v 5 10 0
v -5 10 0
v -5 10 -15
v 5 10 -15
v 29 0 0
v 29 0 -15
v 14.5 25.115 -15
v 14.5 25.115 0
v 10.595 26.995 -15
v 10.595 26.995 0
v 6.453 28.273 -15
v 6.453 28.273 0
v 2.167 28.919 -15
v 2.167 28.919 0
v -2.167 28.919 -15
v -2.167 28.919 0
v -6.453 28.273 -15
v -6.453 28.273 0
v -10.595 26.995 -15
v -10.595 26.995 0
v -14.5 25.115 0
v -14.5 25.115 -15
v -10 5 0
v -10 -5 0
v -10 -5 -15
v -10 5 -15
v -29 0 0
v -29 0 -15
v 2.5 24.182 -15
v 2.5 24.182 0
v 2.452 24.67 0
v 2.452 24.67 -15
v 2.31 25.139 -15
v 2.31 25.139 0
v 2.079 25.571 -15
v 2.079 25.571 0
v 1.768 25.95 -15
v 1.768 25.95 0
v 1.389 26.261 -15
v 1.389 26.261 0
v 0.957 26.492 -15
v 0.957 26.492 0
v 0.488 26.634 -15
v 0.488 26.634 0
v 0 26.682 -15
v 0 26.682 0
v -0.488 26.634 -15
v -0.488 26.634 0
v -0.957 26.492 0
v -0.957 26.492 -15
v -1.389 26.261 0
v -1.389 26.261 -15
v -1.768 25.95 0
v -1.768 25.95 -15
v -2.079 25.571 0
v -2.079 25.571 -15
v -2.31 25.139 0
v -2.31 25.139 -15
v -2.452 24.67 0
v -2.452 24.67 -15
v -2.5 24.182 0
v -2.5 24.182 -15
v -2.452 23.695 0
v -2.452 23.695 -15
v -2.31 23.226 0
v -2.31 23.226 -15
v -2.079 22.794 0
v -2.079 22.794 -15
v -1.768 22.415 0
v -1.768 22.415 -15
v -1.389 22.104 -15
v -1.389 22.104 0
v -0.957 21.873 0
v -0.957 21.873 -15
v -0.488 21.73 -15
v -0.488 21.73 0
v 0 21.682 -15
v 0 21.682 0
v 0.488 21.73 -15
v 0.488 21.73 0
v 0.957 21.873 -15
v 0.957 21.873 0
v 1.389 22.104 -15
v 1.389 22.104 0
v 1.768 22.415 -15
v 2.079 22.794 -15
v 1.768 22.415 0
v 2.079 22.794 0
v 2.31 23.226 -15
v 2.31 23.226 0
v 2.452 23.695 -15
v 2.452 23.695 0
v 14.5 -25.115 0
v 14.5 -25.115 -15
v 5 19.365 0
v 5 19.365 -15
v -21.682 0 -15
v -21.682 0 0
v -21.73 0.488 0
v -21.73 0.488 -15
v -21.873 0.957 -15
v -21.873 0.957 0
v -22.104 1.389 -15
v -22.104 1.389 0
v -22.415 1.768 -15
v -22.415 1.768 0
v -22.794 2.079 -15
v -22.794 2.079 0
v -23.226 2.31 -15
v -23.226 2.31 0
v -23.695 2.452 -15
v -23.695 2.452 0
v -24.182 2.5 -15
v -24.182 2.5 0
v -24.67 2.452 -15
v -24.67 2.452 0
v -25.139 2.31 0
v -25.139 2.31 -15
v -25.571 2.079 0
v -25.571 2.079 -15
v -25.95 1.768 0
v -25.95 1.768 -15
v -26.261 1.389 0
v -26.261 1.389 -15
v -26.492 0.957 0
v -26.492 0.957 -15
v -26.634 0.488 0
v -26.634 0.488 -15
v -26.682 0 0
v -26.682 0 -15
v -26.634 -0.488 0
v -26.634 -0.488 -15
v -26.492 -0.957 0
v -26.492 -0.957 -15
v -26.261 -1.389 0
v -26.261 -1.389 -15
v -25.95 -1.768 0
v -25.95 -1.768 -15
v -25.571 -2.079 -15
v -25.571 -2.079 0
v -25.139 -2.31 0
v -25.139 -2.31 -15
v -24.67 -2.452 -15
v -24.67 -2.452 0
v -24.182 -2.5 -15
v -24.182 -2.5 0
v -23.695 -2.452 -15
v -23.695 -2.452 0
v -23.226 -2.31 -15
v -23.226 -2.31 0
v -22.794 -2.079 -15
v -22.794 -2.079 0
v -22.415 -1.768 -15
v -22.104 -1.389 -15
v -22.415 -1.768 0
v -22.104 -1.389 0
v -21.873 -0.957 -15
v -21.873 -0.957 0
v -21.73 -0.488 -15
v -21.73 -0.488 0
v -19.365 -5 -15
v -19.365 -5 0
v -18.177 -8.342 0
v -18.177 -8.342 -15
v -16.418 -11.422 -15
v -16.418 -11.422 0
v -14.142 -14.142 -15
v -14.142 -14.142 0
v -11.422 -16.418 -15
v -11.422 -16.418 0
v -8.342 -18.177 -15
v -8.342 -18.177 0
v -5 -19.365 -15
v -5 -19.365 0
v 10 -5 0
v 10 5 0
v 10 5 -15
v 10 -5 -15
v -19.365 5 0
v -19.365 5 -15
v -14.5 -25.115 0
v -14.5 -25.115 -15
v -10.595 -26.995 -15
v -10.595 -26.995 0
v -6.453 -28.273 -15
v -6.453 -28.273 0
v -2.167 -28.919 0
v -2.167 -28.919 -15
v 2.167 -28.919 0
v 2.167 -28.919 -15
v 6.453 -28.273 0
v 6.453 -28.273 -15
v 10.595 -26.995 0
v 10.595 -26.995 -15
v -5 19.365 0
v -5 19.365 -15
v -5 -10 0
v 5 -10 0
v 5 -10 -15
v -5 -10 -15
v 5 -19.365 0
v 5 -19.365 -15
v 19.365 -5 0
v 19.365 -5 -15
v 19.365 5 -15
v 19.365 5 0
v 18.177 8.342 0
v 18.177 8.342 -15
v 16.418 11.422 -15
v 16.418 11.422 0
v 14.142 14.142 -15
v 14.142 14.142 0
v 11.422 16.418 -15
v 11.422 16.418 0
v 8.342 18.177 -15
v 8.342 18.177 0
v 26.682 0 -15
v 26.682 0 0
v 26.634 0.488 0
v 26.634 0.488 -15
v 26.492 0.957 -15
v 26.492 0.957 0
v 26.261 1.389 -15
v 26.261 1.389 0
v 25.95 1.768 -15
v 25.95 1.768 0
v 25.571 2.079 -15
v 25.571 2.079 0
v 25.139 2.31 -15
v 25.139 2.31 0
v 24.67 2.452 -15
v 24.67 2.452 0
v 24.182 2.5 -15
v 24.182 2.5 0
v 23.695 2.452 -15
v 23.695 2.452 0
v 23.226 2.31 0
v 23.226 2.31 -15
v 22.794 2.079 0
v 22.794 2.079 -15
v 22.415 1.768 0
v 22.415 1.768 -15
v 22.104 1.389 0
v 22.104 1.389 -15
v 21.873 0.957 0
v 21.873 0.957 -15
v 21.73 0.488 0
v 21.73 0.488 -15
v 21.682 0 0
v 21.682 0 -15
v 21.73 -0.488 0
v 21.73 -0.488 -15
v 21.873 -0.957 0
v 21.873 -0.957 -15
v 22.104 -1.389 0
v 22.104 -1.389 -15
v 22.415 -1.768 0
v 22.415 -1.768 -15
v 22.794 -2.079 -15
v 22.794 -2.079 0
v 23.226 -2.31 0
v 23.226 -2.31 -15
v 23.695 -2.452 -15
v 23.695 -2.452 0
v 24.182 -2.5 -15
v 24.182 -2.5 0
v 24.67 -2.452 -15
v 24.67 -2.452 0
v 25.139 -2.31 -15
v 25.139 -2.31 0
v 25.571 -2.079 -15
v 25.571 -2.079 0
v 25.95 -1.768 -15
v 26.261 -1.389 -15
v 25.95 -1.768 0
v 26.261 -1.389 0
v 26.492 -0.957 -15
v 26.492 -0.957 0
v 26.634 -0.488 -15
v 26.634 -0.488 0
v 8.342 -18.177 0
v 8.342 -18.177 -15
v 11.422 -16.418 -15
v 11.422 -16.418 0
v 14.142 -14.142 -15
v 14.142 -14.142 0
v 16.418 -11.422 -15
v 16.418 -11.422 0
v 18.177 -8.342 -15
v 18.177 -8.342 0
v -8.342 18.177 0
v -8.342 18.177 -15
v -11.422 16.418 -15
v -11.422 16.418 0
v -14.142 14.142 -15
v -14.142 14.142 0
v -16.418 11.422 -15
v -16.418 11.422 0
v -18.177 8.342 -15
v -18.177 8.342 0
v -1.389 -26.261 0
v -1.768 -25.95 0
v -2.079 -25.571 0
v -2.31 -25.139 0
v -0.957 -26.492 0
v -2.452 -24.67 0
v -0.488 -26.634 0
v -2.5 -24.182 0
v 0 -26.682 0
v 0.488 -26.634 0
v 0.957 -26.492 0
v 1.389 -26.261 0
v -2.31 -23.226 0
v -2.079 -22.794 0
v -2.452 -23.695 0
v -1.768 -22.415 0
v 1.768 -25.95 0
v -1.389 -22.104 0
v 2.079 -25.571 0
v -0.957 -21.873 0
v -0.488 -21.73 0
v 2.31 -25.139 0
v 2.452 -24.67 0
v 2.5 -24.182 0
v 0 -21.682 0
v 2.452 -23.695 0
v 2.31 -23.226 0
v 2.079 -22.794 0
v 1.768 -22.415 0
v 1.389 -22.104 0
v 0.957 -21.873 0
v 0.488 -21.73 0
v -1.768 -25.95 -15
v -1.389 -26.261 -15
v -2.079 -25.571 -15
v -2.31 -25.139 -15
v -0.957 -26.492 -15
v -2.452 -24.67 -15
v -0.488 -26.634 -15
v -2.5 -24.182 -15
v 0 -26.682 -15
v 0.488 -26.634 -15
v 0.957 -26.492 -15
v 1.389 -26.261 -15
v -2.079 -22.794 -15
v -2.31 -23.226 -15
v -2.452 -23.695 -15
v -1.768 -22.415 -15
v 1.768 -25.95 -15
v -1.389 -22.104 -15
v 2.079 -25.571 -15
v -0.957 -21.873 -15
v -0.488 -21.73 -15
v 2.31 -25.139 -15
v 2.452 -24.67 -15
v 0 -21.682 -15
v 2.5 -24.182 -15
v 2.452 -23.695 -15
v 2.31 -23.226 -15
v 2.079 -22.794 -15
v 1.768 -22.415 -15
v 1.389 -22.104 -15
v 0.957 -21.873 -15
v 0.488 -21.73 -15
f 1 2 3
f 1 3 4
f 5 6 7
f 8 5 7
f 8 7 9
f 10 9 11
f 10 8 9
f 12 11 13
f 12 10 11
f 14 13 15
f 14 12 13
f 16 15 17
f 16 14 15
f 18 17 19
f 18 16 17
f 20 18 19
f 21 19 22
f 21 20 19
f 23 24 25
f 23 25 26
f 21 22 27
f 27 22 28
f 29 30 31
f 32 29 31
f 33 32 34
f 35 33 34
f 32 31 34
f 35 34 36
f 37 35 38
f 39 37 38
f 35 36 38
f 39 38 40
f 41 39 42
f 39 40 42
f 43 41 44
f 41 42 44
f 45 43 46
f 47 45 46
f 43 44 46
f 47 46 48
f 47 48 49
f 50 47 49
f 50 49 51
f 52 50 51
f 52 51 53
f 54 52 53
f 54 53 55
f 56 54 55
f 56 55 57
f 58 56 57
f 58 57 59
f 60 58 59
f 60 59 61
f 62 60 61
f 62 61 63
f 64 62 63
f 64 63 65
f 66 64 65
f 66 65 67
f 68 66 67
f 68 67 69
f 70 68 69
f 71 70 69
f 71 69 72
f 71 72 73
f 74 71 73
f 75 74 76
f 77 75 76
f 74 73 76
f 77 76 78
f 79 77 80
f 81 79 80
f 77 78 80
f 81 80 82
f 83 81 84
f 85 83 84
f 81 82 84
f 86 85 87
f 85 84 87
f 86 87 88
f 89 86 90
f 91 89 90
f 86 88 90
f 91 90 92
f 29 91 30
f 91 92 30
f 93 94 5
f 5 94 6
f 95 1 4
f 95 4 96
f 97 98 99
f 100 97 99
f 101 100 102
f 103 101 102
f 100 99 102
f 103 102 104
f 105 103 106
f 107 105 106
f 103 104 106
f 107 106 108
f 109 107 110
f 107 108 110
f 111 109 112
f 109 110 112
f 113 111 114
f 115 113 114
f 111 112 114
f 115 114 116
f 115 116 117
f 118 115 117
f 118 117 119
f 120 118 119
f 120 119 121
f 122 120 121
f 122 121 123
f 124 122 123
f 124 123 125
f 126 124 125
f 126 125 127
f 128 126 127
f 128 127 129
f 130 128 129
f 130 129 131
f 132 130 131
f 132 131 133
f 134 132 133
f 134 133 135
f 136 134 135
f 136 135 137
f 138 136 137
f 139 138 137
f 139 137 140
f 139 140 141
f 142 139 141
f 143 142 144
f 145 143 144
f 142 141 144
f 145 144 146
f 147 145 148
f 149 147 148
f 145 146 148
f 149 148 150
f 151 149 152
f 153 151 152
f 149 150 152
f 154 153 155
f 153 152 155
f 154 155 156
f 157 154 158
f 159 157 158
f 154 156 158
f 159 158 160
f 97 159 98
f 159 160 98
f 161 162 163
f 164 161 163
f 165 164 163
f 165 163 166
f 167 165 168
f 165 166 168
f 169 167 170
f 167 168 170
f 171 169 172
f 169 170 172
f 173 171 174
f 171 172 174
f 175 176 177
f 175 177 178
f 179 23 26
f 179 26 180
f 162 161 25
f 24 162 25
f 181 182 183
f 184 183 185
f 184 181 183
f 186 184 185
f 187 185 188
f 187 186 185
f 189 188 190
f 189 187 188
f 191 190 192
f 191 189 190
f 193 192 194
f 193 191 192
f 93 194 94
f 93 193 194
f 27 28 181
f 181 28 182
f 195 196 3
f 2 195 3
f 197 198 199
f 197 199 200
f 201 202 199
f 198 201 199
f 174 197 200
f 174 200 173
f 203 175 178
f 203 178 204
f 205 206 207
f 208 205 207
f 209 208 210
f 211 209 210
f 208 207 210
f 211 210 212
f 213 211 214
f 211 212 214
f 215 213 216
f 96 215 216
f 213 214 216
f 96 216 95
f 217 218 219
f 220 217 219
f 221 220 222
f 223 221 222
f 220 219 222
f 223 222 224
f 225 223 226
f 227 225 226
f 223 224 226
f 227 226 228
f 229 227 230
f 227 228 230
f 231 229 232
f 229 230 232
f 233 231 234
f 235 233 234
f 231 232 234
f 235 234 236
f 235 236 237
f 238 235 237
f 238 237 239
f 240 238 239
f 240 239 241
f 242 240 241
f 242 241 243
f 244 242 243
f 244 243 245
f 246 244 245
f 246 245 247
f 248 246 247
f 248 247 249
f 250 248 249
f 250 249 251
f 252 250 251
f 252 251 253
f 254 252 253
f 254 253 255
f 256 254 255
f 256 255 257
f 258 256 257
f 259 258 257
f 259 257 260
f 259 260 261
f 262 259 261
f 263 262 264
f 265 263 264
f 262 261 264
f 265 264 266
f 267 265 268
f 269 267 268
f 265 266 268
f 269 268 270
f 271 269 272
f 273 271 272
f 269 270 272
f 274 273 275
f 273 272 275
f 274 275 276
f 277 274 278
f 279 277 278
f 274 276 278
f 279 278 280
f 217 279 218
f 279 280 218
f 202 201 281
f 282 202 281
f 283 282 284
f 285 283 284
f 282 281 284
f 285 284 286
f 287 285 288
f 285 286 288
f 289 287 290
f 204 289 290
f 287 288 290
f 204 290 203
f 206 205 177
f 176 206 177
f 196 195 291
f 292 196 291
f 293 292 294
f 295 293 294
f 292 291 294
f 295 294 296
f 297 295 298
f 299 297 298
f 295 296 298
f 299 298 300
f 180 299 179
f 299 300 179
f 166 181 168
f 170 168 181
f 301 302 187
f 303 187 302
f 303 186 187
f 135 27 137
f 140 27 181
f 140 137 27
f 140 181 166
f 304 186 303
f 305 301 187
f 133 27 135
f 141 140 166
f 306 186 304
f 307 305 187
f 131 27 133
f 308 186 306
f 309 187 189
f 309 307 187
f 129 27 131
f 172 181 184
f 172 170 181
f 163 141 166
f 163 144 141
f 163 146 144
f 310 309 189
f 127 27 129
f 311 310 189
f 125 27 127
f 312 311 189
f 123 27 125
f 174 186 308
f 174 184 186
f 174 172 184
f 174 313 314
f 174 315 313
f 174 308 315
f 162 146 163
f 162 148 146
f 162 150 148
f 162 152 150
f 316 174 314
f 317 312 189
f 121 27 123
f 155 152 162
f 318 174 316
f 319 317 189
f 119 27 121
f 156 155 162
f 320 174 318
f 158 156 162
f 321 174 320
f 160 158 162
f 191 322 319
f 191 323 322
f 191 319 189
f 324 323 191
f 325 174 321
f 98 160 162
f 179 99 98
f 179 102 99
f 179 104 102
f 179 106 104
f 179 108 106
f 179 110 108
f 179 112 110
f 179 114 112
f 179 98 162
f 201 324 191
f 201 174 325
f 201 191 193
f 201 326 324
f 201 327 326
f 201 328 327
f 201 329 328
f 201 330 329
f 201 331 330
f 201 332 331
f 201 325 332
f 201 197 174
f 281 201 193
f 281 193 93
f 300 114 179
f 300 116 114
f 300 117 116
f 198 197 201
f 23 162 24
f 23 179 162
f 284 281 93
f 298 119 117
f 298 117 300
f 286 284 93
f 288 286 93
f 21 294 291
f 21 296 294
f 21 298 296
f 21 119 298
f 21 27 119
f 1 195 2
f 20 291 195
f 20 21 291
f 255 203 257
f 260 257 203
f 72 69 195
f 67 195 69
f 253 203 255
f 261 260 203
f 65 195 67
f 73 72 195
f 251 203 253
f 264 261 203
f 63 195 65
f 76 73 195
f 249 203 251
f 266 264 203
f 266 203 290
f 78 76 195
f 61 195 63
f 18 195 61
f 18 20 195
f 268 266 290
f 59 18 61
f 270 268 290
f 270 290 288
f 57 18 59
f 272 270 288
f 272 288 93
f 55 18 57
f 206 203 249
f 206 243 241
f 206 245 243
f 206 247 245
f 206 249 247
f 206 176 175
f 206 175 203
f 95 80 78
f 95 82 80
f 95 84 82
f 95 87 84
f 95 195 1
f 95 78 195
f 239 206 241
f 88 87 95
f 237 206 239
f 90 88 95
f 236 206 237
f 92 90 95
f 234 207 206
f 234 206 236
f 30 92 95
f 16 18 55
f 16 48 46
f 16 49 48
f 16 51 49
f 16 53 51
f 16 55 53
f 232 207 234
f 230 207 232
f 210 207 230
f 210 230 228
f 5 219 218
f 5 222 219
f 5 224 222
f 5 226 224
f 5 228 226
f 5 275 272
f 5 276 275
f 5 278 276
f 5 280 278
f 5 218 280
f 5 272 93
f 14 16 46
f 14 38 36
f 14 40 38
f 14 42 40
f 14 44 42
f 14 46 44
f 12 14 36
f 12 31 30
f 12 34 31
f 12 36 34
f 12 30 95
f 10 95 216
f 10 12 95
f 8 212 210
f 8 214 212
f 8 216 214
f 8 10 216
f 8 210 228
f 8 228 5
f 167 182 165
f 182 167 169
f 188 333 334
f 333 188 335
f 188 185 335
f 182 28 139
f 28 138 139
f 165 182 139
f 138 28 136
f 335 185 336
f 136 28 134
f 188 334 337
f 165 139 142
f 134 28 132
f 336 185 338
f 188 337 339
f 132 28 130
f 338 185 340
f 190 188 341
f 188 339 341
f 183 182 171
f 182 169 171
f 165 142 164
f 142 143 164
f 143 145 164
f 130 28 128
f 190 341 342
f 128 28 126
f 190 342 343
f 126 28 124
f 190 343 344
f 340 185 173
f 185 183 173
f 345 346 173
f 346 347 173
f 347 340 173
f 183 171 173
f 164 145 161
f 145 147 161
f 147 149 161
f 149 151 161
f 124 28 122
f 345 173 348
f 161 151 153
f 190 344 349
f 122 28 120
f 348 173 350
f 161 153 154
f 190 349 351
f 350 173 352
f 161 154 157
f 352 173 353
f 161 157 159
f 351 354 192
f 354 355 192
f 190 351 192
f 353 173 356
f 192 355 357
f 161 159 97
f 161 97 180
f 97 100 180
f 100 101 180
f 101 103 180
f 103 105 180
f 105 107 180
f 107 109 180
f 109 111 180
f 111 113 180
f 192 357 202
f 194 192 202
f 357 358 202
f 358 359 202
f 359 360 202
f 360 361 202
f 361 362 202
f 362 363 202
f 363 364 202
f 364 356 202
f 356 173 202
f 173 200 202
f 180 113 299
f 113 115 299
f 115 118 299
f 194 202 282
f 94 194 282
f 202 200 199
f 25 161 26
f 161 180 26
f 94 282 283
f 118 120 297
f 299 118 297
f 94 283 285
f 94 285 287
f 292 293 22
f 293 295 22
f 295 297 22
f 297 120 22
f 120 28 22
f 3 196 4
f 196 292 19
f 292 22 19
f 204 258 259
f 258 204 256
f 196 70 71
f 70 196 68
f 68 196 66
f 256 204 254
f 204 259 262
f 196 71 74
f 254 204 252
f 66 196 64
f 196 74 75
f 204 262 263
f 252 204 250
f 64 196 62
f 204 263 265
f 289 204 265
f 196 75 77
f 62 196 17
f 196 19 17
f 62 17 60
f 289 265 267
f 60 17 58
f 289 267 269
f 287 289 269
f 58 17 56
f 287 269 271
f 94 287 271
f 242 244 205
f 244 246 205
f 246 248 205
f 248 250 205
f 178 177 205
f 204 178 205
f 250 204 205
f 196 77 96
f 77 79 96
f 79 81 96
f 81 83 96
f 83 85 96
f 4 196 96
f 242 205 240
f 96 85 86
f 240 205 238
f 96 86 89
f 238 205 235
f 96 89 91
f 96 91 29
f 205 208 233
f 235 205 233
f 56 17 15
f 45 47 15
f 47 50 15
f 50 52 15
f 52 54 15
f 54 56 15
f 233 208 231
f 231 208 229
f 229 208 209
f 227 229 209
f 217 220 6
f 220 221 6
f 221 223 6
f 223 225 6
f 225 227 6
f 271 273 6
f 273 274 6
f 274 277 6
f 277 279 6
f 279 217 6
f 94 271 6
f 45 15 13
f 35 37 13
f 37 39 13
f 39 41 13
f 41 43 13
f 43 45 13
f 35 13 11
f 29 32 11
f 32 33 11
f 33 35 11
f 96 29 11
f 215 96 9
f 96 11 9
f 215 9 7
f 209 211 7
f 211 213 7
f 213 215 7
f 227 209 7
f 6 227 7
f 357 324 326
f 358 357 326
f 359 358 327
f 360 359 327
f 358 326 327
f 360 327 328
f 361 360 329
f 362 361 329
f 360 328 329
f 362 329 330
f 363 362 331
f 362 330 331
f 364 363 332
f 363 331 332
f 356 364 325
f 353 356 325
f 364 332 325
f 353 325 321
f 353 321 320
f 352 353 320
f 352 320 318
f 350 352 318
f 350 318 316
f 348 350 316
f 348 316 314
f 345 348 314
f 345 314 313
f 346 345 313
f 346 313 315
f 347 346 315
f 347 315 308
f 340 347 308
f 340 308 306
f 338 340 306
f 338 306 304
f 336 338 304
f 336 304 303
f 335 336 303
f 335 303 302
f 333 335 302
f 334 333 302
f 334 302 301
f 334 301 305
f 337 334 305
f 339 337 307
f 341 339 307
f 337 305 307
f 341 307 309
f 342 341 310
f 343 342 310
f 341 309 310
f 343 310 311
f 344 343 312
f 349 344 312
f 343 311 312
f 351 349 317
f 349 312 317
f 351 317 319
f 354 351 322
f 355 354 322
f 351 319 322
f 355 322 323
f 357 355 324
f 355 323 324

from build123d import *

# Parameters (mm, degrees)
SKETCH6_R                 = 29
SKETCH6_R_2               = 20
INNER_RING_DEPTH          = 15
MOTOR_CONNECTOR_CUT_DEPTH = 15
SKETCH8_R                 = 2.5
M3_HOLES_DEPTH            = 38
M3_HOLES_DEPTH_BACK       = 53
CUT_EXTRUDE1_DEPTH        = 16
CUT_EXTRUDE1_DEPTH_BACK   = 27


with BuildPart() as part:
    # Sketch6 → Inner Ring (new body)
    with BuildSketch(Plane.XY):
        Circle(SKETCH6_R)
        Circle(SKETCH6_R_2, mode=Mode.SUBTRACT)
    extrude(amount=-INNER_RING_DEPTH)

    # Sketch7 → Motor Connector Cut (add)
    with BuildSketch(Plane.XY):
        with BuildLine():
            ThreePointArc((20, 0), (19.840593925, 2.52008585), (19.364916731, 5))
            Line((19.364916731, 5), (9.999996731, 5))
            Line((9.999996731, 5), (9.999996731, -5))
            Line((9.999996731, -5), (19.364916731, -5))
            ThreePointArc((19.364916731, -5), (19.840593925, -2.52008585), (20, 0))
        make_face()
        with BuildLine():
            ThreePointArc((5, 19.364916731), (0, 20), (-5, 19.364916731))
            Line((-5, 19.364916731), (-5, 9.999996731))
            Line((-5, 9.999996731), (5, 9.999996731))
            Line((5, 9.999996731), (5, 19.364916731))
        make_face()
        with BuildLine():
            Line((-9.999996731, -5), (-9.999996731, 5))
            Line((-9.999996731, 5), (-19.364916731, 5))
            ThreePointArc((-19.364916731, 5), (-20, 0), (-19.364916731, -5))
            Line((-19.364916731, -5), (-9.999996731, -5))
        make_face()
        with BuildLine():
            Line((-5, -9.999996731), (-5, -19.364916731))
            ThreePointArc((-5, -19.364916731), (0, -20), (5, -19.364916731))
            Line((5, -19.364916731), (5, -9.999996731))
            Line((5, -9.999996731), (-5, -9.999996731))
        make_face()
    extrude(amount=-MOTOR_CONNECTOR_CUT_DEPTH)

    # Sketch8 → M3 Holes (cut, two sides)
    with BuildSketch(Plane.XY) as m3_holes_sk:
        with Locations((0, 24.182458366)):
            Circle(SKETCH8_R)
        with Locations((24.182458366, 0)):
            Circle(SKETCH8_R)
        with Locations((0, -24.182458366)):
            Circle(SKETCH8_R)
        with Locations((-24.182458366, 0)):
            Circle(SKETCH8_R)
    extrude(amount=M3_HOLES_DEPTH, mode=Mode.SUBTRACT)
    extrude(m3_holes_sk.sketch, amount=-M3_HOLES_DEPTH_BACK, mode=Mode.SUBTRACT)

    # Sketch9 → Cut-Extrude1 (cut, two sides)
    with BuildSketch(Plane(origin=(0, 0, -15), x_dir=(-1, 0, 0), z_dir=(0, 0, -1))) as cut_extrude1_sk:
        with BuildLine():
            Line((14.5, 25.11473671), (29, 0))
            ThreePointArc((29, 0), (25.11473671, 14.5), (14.5, 25.11473671))
        make_face()
        with BuildLine():
            Line((-29, 0), (-14.5, 25.11473671))
            ThreePointArc((-14.5, 25.11473671), (-25.11473671, 14.5), (-29, 0))
        make_face()
        with BuildLine():
            ThreePointArc((-29, 0), (-25.11473671, -14.5), (-14.5, -25.11473671))
            Line((-14.5, -25.11473671), (-29, 0))
        make_face()
        with BuildLine():
            ThreePointArc((14.5, -25.11473671), (25.11473671, -14.5), (29, 0))
            Line((29, 0), (14.5, -25.11473671))
        make_face()
    extrude(amount=CUT_EXTRUDE1_DEPTH, mode=Mode.SUBTRACT)
    extrude(cut_extrude1_sk.sketch, amount=-CUT_EXTRUDE1_DEPTH_BACK, mode=Mode.SUBTRACT)


solid = part.part
